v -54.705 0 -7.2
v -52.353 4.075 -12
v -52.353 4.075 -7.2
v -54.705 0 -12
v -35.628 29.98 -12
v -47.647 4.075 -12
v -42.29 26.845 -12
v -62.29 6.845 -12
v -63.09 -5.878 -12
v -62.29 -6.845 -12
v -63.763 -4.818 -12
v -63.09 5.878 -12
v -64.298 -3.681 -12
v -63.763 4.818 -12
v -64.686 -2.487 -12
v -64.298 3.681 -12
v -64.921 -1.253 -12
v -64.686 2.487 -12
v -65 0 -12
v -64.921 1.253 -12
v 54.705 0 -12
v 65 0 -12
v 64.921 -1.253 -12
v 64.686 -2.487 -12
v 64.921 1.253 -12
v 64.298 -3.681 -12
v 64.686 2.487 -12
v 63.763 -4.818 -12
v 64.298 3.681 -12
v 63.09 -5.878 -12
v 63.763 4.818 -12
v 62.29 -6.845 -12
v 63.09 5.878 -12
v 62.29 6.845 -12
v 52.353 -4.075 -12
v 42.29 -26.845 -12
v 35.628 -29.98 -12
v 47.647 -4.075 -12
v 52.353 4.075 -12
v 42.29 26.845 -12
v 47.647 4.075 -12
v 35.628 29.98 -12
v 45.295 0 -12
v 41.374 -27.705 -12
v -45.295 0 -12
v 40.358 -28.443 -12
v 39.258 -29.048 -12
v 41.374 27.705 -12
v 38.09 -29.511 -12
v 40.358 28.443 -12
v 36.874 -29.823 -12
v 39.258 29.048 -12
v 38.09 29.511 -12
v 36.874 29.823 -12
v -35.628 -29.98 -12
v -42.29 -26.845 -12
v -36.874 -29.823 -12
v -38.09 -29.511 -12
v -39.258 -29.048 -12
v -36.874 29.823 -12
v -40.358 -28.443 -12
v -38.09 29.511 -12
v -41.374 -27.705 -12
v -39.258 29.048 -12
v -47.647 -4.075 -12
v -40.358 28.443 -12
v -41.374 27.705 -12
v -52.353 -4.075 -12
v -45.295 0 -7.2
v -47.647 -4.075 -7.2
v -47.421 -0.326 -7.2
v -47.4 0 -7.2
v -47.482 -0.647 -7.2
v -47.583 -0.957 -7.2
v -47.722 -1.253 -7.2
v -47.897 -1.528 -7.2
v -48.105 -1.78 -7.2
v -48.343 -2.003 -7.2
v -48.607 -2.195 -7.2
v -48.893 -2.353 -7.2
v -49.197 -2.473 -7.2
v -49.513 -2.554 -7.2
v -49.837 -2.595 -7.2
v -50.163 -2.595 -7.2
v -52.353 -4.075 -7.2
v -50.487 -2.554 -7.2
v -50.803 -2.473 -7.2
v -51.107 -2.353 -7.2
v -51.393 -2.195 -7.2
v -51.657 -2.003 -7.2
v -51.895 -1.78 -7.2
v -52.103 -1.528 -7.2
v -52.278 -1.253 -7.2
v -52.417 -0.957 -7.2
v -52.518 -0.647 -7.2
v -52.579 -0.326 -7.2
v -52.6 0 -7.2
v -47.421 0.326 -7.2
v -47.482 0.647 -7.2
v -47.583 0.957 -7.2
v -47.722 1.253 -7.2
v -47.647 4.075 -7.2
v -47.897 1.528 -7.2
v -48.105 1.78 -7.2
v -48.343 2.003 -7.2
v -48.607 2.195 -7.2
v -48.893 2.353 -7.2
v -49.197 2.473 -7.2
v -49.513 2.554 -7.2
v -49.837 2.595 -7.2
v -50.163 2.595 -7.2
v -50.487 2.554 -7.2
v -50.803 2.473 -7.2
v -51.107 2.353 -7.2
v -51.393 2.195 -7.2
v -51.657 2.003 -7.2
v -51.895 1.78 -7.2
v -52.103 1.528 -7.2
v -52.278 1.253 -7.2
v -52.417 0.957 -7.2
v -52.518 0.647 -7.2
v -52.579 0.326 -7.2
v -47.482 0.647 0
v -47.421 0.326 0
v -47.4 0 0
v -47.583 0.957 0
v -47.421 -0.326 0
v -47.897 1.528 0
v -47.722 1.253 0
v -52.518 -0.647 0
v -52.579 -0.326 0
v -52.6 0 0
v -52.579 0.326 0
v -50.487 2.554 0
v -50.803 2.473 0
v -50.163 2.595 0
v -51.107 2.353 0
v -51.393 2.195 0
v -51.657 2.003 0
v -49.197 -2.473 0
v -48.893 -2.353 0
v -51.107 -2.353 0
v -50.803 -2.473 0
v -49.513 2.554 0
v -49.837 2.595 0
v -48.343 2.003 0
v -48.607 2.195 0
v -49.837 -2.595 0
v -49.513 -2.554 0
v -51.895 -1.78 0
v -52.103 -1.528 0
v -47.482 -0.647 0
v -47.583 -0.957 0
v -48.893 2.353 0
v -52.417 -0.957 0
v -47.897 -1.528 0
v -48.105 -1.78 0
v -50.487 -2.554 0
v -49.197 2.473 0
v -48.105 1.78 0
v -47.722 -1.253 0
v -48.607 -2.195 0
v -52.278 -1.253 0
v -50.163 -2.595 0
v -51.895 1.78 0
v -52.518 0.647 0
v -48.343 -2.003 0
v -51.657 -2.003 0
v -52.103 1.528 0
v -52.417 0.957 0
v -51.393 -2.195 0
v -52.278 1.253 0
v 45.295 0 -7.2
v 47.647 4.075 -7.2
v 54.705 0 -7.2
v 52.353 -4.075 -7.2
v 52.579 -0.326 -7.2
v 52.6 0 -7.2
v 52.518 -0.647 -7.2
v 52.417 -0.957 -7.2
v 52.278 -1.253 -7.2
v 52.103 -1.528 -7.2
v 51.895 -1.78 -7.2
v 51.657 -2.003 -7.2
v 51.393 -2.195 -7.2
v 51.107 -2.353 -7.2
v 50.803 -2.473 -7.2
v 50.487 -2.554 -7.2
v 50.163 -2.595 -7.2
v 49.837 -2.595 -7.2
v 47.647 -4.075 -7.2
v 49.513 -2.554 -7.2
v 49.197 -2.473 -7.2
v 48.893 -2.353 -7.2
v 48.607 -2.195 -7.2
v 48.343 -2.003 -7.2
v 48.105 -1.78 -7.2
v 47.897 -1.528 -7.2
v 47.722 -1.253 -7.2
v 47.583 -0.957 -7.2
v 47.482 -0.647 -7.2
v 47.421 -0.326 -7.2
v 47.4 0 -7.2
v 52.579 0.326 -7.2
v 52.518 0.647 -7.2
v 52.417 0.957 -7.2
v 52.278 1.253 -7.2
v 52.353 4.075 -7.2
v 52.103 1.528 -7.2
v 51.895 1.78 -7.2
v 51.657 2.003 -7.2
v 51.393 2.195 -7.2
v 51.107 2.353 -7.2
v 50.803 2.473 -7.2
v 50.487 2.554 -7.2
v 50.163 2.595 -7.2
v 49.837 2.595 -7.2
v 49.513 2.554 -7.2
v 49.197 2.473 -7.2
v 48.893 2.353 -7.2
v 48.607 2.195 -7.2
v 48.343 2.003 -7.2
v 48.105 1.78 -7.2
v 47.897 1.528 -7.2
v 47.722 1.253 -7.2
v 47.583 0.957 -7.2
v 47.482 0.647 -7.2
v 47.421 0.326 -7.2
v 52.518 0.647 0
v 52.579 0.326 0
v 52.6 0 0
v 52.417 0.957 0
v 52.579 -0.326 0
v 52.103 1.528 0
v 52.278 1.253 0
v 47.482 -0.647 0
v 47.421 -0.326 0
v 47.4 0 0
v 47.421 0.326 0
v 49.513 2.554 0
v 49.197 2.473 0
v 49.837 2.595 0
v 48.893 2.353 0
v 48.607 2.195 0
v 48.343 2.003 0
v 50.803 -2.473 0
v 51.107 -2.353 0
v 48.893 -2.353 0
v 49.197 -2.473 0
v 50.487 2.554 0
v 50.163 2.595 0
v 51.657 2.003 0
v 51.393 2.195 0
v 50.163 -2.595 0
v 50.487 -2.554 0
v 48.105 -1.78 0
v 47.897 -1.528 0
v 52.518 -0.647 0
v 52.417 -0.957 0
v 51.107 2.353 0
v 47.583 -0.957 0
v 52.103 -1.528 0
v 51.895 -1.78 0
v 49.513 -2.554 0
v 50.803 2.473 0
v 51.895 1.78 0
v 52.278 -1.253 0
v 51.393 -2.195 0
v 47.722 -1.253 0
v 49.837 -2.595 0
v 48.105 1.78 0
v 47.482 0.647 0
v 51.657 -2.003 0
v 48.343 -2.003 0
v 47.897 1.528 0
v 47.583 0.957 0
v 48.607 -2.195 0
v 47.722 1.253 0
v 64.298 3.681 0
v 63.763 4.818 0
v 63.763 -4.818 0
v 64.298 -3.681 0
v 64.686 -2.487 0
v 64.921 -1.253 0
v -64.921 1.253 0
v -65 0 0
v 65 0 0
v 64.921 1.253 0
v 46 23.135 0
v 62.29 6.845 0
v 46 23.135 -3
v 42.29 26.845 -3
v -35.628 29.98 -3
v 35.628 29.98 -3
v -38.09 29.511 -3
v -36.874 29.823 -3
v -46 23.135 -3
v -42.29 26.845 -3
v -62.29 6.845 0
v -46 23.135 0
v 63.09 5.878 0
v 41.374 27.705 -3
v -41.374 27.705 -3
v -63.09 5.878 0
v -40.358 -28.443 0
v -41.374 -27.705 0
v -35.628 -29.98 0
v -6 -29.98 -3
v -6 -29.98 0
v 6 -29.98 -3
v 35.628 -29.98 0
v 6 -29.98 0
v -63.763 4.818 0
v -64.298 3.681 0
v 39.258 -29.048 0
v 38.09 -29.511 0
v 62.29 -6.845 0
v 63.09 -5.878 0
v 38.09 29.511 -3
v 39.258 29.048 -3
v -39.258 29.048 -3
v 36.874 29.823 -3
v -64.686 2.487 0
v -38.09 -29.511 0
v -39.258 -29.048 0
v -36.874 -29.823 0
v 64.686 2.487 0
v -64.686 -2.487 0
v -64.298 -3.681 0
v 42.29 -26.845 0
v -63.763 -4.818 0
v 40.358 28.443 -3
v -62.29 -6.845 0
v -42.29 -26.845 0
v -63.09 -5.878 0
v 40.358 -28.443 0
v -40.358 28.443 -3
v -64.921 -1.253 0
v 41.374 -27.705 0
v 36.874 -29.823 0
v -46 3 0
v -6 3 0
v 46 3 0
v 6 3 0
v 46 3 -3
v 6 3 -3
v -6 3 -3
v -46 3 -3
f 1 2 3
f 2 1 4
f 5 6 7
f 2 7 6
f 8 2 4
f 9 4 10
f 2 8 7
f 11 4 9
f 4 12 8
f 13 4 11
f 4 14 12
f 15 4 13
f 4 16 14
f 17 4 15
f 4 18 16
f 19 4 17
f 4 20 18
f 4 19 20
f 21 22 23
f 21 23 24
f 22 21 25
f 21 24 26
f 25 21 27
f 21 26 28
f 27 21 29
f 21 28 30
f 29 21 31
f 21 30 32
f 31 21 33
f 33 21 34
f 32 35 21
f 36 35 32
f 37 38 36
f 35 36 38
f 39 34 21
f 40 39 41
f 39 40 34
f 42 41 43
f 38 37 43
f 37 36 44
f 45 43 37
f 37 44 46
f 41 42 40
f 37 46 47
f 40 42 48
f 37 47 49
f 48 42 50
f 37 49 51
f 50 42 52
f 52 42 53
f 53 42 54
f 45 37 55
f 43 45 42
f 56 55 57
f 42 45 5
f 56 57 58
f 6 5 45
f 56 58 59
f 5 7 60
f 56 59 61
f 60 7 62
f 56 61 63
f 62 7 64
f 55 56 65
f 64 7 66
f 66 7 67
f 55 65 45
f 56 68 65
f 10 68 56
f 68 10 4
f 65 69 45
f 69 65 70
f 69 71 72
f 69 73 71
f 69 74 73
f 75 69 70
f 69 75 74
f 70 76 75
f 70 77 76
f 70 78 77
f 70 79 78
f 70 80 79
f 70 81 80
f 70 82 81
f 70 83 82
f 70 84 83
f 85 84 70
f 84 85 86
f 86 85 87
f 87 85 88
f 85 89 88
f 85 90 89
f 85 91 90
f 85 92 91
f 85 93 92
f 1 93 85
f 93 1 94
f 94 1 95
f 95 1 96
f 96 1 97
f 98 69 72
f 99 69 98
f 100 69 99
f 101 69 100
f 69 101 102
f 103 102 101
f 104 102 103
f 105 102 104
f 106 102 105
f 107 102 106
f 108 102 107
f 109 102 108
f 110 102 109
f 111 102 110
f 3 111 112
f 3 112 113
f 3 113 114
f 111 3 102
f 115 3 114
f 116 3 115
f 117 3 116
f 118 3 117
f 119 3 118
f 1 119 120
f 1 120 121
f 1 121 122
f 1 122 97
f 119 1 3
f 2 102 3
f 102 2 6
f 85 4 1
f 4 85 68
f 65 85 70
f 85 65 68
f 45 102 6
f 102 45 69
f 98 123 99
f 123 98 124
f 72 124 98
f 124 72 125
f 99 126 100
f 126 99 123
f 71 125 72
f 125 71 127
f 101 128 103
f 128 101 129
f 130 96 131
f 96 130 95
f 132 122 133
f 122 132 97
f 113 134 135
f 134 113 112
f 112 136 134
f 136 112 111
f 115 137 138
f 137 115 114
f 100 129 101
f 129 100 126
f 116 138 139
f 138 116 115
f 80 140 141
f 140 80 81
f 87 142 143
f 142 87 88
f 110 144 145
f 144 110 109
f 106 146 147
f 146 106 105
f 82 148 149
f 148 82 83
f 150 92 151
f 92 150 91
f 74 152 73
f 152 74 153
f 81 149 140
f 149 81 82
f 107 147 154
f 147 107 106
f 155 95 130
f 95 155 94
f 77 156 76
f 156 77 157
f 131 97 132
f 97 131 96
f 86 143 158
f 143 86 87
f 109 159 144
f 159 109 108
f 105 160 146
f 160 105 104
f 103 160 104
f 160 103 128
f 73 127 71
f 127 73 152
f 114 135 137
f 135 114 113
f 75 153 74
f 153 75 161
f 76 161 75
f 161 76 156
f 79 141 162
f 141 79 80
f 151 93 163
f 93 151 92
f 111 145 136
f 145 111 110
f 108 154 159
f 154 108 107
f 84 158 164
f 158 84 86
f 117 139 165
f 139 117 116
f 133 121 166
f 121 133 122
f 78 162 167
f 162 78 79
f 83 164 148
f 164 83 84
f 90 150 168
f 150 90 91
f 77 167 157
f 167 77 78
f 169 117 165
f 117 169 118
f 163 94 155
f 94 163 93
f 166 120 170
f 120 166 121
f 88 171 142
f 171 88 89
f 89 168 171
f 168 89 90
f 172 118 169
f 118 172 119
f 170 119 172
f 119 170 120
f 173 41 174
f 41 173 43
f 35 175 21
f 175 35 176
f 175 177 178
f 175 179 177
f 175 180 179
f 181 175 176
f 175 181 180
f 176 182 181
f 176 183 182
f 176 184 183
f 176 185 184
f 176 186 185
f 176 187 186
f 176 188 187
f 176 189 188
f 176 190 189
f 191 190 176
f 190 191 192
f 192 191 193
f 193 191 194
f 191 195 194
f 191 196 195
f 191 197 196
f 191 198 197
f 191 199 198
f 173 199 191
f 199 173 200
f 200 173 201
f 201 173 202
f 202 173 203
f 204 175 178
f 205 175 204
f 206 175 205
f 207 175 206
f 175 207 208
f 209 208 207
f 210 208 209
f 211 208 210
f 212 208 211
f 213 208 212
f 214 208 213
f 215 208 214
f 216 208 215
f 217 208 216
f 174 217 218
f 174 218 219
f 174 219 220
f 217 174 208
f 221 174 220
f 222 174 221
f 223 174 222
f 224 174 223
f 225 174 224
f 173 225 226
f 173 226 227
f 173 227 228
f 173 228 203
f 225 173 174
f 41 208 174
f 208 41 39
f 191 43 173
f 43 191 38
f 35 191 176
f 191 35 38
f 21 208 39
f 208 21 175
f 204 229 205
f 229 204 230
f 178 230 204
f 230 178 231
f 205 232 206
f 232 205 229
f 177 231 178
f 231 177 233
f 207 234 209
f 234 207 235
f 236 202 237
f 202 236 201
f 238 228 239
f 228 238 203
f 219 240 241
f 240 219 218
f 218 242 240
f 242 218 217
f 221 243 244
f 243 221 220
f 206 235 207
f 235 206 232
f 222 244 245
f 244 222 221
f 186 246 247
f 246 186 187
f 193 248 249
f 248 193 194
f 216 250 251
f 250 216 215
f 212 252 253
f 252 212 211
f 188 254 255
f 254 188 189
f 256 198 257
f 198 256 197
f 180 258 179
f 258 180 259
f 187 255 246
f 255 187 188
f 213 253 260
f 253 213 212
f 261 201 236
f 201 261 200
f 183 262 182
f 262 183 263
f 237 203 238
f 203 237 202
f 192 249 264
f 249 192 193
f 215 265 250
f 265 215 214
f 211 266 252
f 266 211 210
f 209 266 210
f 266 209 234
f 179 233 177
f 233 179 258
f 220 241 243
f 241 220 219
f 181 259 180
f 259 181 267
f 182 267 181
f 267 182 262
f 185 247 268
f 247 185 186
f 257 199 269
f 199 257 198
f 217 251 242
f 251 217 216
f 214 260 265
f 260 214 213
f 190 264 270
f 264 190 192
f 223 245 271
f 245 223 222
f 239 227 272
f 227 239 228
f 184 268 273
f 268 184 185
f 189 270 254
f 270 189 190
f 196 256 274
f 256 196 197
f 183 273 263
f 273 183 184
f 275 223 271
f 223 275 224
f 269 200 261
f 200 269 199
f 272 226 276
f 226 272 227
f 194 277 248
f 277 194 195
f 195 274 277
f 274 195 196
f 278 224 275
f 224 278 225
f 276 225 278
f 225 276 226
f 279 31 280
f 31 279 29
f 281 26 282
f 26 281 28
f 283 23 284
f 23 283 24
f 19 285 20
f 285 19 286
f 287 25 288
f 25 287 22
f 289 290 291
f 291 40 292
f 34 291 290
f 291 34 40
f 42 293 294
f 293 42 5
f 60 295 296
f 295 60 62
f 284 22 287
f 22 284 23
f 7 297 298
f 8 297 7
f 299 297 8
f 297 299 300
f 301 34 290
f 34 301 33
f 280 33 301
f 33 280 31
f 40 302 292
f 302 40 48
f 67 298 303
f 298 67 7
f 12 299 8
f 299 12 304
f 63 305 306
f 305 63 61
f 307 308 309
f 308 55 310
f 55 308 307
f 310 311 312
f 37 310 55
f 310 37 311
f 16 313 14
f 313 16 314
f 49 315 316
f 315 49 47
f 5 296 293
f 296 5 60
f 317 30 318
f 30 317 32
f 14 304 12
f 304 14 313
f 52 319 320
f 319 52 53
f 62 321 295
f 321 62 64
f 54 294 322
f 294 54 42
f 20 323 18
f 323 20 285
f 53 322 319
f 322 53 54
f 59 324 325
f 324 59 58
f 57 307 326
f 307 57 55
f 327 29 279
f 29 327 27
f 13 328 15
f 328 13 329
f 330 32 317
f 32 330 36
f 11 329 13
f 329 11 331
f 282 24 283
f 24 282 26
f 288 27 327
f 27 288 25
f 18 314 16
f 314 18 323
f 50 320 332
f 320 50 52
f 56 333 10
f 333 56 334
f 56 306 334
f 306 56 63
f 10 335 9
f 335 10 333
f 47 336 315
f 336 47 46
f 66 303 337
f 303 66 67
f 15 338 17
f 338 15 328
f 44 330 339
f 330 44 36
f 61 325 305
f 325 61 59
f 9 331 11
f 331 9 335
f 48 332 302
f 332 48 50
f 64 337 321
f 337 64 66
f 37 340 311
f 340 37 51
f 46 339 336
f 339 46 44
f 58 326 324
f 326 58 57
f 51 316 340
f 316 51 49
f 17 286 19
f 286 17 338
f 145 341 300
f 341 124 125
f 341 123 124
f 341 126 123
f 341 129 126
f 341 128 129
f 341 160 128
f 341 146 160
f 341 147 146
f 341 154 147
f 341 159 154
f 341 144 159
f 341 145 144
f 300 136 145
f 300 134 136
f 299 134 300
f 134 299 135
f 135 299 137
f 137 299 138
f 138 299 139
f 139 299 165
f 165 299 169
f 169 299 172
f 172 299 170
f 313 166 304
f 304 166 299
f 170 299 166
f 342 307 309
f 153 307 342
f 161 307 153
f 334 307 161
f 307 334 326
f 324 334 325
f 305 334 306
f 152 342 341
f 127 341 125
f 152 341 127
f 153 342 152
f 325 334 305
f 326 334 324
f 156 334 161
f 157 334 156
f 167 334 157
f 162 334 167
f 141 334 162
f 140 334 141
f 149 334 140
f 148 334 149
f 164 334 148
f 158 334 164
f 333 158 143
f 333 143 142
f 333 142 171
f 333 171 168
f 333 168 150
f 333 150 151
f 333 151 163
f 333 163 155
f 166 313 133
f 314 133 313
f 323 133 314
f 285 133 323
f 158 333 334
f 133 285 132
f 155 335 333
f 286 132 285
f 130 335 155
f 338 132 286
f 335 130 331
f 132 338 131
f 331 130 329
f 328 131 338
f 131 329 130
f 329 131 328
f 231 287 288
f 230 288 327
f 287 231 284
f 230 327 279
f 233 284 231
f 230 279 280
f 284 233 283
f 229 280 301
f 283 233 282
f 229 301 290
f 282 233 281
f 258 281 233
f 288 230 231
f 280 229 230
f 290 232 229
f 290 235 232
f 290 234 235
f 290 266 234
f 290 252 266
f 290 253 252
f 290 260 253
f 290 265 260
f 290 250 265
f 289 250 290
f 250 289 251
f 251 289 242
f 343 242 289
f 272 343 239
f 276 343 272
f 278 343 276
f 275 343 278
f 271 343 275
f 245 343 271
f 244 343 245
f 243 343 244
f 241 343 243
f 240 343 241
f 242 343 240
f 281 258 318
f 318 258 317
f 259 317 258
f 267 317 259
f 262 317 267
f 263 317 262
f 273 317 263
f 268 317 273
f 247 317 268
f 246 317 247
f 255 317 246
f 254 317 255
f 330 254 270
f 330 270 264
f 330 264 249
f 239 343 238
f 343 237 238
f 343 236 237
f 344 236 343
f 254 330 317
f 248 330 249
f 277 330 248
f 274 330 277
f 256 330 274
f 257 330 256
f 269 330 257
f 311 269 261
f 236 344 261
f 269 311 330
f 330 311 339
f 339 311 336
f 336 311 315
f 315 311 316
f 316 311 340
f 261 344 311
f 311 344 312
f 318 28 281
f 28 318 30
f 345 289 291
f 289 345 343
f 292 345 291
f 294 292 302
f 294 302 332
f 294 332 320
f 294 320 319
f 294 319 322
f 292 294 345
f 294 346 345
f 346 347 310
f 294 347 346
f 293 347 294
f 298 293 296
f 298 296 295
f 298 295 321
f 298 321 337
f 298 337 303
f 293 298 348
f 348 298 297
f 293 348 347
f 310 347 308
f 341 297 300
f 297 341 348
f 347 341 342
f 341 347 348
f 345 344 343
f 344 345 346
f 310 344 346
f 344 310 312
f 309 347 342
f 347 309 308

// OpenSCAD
$fn=50;

// translate([0,0,-30]){
//     bottom();
// }

// topWithHandleHolder();

module topWithHandleHolder(){
    difference(){
        union(){
            top();
            translate([55,0,0]){
                rotatedHandleHolder();
            }
        }
        handleHole();
    }
}

module rotatedHandleHolder(){
    intersection(){
        rotate([20,0,0]){
            handleHolder();
        }
        translate([0,-5,50]){
            cube([100,70,80], center=true);
        }
    }
}

module handleHole(){
    translate([55,0,0]){
        rotate([20,0,0]){
            translate([0,0,-10]){
                cylinder(90,11,11);
            }
        }
    }
}

module handleHolder(){
    translate([0,0,-10]){
        cylinder(80,15,15);
    }
    fin(0);
    fin(90);
    fin(180);
    fin(270);
}

module fin(zRotation){
    rotate([0,-18,zRotation]){
        translate([18,0,15]){
            cube([20,5,80], center=true);
        }
    }
}

bottomPlate();

module bottomPlate(){
    plateHeight = 12;
    holeX = 50;
    holeY = 0;
    difference(){
        plate3d(plateHeight);
        translate([-holeX, holeY, -plateHeight]){
            m5nutWithScrewHole();
        }
        translate([holeX, holeY, -plateHeight]){
            m5nutWithScrewHole();
        }
        cutoutHeight = 3;
        translate([0, 16.5, -cutoutHeight/2]){
            cube([92, 27, cutoutHeight], center=true);
        }
        translate([0, 0, -cutoutHeight/2]){
            cube([12, 60, cutoutHeight], center=true);
        }
    }
}


module topPlate(){
    plateHeight = 12;
    holeX = 50;
    holeY = 0;
    difference(){
        plate3d(plateHeight);
        translate([-holeX, holeY, 0]){
            m5countersinkScrew();
        }
        translate([holeX, holeY, 0]){
            m5countersinkScrew();
        }
    }
}

module plate3d(height){
    translate([0,0,-height]){
        linear_extrude(height = height, center = false, convexity = 10, twist = 0){
            plate2d();
        }
    }
}

module plate2d(){
    cornerX = 35;
    cornerY = 20;
    tipX = 55;
    tipY = 0;

    hull(){
        corner(-tipX,tipY);
        corner(-cornerX,cornerY);
        corner(-cornerX,-cornerY);
        corner(cornerX,cornerY);
        corner(cornerX,-cornerY);
        corner(tipX,tipY);
    }
}

module corner(x,y){
    translate([x,y,0]){
        circle(r=10);
    }
}

module m5nutWithScrewHole(){
    screwHoleHeight = 20;
    screwholeRadius = 5.2 / 2;
    m5nut();
    cylinder(screwHoleHeight,screwholeRadius,screwholeRadius);
}

module m5nut(){
    height = 4.8;
    shortDiagonale = 8.15;
    longDiagonale = shortDiagonale * 2 / sqrt(3);
    echo(longDiagonale);
    linear_extrude(height = height, center = false, convexity = 10, twist = 0){
        hexagon(longDiagonale);
    }
}

module hexagon(longDiagonale){
    radius = longDiagonale / 2;
    polygon(points=[
        [radius, 0],
        [radius*cos(60),radius*sin(60)],
        [radius*cos(120),radius*sin(120)],
        [-radius,0],
        [radius*cos(240),radius*sin(240)],
        [radius*cos(300),radius*sin(300)],
    ]);
}

module m5countersinkScrew(){
    holeRadius = 5.2 / 2;
    holeHeigth = 50;
    headRadius = 9.5 / 2;
    headHeight = 4;
    translate([0, 0, -headHeight]){
        cylinder(headHeight, holeRadius, headRadius);
    }
    translate([0,0,-53]){
        cylinder(holeHeigth, holeRadius, holeRadius);
    }
}
